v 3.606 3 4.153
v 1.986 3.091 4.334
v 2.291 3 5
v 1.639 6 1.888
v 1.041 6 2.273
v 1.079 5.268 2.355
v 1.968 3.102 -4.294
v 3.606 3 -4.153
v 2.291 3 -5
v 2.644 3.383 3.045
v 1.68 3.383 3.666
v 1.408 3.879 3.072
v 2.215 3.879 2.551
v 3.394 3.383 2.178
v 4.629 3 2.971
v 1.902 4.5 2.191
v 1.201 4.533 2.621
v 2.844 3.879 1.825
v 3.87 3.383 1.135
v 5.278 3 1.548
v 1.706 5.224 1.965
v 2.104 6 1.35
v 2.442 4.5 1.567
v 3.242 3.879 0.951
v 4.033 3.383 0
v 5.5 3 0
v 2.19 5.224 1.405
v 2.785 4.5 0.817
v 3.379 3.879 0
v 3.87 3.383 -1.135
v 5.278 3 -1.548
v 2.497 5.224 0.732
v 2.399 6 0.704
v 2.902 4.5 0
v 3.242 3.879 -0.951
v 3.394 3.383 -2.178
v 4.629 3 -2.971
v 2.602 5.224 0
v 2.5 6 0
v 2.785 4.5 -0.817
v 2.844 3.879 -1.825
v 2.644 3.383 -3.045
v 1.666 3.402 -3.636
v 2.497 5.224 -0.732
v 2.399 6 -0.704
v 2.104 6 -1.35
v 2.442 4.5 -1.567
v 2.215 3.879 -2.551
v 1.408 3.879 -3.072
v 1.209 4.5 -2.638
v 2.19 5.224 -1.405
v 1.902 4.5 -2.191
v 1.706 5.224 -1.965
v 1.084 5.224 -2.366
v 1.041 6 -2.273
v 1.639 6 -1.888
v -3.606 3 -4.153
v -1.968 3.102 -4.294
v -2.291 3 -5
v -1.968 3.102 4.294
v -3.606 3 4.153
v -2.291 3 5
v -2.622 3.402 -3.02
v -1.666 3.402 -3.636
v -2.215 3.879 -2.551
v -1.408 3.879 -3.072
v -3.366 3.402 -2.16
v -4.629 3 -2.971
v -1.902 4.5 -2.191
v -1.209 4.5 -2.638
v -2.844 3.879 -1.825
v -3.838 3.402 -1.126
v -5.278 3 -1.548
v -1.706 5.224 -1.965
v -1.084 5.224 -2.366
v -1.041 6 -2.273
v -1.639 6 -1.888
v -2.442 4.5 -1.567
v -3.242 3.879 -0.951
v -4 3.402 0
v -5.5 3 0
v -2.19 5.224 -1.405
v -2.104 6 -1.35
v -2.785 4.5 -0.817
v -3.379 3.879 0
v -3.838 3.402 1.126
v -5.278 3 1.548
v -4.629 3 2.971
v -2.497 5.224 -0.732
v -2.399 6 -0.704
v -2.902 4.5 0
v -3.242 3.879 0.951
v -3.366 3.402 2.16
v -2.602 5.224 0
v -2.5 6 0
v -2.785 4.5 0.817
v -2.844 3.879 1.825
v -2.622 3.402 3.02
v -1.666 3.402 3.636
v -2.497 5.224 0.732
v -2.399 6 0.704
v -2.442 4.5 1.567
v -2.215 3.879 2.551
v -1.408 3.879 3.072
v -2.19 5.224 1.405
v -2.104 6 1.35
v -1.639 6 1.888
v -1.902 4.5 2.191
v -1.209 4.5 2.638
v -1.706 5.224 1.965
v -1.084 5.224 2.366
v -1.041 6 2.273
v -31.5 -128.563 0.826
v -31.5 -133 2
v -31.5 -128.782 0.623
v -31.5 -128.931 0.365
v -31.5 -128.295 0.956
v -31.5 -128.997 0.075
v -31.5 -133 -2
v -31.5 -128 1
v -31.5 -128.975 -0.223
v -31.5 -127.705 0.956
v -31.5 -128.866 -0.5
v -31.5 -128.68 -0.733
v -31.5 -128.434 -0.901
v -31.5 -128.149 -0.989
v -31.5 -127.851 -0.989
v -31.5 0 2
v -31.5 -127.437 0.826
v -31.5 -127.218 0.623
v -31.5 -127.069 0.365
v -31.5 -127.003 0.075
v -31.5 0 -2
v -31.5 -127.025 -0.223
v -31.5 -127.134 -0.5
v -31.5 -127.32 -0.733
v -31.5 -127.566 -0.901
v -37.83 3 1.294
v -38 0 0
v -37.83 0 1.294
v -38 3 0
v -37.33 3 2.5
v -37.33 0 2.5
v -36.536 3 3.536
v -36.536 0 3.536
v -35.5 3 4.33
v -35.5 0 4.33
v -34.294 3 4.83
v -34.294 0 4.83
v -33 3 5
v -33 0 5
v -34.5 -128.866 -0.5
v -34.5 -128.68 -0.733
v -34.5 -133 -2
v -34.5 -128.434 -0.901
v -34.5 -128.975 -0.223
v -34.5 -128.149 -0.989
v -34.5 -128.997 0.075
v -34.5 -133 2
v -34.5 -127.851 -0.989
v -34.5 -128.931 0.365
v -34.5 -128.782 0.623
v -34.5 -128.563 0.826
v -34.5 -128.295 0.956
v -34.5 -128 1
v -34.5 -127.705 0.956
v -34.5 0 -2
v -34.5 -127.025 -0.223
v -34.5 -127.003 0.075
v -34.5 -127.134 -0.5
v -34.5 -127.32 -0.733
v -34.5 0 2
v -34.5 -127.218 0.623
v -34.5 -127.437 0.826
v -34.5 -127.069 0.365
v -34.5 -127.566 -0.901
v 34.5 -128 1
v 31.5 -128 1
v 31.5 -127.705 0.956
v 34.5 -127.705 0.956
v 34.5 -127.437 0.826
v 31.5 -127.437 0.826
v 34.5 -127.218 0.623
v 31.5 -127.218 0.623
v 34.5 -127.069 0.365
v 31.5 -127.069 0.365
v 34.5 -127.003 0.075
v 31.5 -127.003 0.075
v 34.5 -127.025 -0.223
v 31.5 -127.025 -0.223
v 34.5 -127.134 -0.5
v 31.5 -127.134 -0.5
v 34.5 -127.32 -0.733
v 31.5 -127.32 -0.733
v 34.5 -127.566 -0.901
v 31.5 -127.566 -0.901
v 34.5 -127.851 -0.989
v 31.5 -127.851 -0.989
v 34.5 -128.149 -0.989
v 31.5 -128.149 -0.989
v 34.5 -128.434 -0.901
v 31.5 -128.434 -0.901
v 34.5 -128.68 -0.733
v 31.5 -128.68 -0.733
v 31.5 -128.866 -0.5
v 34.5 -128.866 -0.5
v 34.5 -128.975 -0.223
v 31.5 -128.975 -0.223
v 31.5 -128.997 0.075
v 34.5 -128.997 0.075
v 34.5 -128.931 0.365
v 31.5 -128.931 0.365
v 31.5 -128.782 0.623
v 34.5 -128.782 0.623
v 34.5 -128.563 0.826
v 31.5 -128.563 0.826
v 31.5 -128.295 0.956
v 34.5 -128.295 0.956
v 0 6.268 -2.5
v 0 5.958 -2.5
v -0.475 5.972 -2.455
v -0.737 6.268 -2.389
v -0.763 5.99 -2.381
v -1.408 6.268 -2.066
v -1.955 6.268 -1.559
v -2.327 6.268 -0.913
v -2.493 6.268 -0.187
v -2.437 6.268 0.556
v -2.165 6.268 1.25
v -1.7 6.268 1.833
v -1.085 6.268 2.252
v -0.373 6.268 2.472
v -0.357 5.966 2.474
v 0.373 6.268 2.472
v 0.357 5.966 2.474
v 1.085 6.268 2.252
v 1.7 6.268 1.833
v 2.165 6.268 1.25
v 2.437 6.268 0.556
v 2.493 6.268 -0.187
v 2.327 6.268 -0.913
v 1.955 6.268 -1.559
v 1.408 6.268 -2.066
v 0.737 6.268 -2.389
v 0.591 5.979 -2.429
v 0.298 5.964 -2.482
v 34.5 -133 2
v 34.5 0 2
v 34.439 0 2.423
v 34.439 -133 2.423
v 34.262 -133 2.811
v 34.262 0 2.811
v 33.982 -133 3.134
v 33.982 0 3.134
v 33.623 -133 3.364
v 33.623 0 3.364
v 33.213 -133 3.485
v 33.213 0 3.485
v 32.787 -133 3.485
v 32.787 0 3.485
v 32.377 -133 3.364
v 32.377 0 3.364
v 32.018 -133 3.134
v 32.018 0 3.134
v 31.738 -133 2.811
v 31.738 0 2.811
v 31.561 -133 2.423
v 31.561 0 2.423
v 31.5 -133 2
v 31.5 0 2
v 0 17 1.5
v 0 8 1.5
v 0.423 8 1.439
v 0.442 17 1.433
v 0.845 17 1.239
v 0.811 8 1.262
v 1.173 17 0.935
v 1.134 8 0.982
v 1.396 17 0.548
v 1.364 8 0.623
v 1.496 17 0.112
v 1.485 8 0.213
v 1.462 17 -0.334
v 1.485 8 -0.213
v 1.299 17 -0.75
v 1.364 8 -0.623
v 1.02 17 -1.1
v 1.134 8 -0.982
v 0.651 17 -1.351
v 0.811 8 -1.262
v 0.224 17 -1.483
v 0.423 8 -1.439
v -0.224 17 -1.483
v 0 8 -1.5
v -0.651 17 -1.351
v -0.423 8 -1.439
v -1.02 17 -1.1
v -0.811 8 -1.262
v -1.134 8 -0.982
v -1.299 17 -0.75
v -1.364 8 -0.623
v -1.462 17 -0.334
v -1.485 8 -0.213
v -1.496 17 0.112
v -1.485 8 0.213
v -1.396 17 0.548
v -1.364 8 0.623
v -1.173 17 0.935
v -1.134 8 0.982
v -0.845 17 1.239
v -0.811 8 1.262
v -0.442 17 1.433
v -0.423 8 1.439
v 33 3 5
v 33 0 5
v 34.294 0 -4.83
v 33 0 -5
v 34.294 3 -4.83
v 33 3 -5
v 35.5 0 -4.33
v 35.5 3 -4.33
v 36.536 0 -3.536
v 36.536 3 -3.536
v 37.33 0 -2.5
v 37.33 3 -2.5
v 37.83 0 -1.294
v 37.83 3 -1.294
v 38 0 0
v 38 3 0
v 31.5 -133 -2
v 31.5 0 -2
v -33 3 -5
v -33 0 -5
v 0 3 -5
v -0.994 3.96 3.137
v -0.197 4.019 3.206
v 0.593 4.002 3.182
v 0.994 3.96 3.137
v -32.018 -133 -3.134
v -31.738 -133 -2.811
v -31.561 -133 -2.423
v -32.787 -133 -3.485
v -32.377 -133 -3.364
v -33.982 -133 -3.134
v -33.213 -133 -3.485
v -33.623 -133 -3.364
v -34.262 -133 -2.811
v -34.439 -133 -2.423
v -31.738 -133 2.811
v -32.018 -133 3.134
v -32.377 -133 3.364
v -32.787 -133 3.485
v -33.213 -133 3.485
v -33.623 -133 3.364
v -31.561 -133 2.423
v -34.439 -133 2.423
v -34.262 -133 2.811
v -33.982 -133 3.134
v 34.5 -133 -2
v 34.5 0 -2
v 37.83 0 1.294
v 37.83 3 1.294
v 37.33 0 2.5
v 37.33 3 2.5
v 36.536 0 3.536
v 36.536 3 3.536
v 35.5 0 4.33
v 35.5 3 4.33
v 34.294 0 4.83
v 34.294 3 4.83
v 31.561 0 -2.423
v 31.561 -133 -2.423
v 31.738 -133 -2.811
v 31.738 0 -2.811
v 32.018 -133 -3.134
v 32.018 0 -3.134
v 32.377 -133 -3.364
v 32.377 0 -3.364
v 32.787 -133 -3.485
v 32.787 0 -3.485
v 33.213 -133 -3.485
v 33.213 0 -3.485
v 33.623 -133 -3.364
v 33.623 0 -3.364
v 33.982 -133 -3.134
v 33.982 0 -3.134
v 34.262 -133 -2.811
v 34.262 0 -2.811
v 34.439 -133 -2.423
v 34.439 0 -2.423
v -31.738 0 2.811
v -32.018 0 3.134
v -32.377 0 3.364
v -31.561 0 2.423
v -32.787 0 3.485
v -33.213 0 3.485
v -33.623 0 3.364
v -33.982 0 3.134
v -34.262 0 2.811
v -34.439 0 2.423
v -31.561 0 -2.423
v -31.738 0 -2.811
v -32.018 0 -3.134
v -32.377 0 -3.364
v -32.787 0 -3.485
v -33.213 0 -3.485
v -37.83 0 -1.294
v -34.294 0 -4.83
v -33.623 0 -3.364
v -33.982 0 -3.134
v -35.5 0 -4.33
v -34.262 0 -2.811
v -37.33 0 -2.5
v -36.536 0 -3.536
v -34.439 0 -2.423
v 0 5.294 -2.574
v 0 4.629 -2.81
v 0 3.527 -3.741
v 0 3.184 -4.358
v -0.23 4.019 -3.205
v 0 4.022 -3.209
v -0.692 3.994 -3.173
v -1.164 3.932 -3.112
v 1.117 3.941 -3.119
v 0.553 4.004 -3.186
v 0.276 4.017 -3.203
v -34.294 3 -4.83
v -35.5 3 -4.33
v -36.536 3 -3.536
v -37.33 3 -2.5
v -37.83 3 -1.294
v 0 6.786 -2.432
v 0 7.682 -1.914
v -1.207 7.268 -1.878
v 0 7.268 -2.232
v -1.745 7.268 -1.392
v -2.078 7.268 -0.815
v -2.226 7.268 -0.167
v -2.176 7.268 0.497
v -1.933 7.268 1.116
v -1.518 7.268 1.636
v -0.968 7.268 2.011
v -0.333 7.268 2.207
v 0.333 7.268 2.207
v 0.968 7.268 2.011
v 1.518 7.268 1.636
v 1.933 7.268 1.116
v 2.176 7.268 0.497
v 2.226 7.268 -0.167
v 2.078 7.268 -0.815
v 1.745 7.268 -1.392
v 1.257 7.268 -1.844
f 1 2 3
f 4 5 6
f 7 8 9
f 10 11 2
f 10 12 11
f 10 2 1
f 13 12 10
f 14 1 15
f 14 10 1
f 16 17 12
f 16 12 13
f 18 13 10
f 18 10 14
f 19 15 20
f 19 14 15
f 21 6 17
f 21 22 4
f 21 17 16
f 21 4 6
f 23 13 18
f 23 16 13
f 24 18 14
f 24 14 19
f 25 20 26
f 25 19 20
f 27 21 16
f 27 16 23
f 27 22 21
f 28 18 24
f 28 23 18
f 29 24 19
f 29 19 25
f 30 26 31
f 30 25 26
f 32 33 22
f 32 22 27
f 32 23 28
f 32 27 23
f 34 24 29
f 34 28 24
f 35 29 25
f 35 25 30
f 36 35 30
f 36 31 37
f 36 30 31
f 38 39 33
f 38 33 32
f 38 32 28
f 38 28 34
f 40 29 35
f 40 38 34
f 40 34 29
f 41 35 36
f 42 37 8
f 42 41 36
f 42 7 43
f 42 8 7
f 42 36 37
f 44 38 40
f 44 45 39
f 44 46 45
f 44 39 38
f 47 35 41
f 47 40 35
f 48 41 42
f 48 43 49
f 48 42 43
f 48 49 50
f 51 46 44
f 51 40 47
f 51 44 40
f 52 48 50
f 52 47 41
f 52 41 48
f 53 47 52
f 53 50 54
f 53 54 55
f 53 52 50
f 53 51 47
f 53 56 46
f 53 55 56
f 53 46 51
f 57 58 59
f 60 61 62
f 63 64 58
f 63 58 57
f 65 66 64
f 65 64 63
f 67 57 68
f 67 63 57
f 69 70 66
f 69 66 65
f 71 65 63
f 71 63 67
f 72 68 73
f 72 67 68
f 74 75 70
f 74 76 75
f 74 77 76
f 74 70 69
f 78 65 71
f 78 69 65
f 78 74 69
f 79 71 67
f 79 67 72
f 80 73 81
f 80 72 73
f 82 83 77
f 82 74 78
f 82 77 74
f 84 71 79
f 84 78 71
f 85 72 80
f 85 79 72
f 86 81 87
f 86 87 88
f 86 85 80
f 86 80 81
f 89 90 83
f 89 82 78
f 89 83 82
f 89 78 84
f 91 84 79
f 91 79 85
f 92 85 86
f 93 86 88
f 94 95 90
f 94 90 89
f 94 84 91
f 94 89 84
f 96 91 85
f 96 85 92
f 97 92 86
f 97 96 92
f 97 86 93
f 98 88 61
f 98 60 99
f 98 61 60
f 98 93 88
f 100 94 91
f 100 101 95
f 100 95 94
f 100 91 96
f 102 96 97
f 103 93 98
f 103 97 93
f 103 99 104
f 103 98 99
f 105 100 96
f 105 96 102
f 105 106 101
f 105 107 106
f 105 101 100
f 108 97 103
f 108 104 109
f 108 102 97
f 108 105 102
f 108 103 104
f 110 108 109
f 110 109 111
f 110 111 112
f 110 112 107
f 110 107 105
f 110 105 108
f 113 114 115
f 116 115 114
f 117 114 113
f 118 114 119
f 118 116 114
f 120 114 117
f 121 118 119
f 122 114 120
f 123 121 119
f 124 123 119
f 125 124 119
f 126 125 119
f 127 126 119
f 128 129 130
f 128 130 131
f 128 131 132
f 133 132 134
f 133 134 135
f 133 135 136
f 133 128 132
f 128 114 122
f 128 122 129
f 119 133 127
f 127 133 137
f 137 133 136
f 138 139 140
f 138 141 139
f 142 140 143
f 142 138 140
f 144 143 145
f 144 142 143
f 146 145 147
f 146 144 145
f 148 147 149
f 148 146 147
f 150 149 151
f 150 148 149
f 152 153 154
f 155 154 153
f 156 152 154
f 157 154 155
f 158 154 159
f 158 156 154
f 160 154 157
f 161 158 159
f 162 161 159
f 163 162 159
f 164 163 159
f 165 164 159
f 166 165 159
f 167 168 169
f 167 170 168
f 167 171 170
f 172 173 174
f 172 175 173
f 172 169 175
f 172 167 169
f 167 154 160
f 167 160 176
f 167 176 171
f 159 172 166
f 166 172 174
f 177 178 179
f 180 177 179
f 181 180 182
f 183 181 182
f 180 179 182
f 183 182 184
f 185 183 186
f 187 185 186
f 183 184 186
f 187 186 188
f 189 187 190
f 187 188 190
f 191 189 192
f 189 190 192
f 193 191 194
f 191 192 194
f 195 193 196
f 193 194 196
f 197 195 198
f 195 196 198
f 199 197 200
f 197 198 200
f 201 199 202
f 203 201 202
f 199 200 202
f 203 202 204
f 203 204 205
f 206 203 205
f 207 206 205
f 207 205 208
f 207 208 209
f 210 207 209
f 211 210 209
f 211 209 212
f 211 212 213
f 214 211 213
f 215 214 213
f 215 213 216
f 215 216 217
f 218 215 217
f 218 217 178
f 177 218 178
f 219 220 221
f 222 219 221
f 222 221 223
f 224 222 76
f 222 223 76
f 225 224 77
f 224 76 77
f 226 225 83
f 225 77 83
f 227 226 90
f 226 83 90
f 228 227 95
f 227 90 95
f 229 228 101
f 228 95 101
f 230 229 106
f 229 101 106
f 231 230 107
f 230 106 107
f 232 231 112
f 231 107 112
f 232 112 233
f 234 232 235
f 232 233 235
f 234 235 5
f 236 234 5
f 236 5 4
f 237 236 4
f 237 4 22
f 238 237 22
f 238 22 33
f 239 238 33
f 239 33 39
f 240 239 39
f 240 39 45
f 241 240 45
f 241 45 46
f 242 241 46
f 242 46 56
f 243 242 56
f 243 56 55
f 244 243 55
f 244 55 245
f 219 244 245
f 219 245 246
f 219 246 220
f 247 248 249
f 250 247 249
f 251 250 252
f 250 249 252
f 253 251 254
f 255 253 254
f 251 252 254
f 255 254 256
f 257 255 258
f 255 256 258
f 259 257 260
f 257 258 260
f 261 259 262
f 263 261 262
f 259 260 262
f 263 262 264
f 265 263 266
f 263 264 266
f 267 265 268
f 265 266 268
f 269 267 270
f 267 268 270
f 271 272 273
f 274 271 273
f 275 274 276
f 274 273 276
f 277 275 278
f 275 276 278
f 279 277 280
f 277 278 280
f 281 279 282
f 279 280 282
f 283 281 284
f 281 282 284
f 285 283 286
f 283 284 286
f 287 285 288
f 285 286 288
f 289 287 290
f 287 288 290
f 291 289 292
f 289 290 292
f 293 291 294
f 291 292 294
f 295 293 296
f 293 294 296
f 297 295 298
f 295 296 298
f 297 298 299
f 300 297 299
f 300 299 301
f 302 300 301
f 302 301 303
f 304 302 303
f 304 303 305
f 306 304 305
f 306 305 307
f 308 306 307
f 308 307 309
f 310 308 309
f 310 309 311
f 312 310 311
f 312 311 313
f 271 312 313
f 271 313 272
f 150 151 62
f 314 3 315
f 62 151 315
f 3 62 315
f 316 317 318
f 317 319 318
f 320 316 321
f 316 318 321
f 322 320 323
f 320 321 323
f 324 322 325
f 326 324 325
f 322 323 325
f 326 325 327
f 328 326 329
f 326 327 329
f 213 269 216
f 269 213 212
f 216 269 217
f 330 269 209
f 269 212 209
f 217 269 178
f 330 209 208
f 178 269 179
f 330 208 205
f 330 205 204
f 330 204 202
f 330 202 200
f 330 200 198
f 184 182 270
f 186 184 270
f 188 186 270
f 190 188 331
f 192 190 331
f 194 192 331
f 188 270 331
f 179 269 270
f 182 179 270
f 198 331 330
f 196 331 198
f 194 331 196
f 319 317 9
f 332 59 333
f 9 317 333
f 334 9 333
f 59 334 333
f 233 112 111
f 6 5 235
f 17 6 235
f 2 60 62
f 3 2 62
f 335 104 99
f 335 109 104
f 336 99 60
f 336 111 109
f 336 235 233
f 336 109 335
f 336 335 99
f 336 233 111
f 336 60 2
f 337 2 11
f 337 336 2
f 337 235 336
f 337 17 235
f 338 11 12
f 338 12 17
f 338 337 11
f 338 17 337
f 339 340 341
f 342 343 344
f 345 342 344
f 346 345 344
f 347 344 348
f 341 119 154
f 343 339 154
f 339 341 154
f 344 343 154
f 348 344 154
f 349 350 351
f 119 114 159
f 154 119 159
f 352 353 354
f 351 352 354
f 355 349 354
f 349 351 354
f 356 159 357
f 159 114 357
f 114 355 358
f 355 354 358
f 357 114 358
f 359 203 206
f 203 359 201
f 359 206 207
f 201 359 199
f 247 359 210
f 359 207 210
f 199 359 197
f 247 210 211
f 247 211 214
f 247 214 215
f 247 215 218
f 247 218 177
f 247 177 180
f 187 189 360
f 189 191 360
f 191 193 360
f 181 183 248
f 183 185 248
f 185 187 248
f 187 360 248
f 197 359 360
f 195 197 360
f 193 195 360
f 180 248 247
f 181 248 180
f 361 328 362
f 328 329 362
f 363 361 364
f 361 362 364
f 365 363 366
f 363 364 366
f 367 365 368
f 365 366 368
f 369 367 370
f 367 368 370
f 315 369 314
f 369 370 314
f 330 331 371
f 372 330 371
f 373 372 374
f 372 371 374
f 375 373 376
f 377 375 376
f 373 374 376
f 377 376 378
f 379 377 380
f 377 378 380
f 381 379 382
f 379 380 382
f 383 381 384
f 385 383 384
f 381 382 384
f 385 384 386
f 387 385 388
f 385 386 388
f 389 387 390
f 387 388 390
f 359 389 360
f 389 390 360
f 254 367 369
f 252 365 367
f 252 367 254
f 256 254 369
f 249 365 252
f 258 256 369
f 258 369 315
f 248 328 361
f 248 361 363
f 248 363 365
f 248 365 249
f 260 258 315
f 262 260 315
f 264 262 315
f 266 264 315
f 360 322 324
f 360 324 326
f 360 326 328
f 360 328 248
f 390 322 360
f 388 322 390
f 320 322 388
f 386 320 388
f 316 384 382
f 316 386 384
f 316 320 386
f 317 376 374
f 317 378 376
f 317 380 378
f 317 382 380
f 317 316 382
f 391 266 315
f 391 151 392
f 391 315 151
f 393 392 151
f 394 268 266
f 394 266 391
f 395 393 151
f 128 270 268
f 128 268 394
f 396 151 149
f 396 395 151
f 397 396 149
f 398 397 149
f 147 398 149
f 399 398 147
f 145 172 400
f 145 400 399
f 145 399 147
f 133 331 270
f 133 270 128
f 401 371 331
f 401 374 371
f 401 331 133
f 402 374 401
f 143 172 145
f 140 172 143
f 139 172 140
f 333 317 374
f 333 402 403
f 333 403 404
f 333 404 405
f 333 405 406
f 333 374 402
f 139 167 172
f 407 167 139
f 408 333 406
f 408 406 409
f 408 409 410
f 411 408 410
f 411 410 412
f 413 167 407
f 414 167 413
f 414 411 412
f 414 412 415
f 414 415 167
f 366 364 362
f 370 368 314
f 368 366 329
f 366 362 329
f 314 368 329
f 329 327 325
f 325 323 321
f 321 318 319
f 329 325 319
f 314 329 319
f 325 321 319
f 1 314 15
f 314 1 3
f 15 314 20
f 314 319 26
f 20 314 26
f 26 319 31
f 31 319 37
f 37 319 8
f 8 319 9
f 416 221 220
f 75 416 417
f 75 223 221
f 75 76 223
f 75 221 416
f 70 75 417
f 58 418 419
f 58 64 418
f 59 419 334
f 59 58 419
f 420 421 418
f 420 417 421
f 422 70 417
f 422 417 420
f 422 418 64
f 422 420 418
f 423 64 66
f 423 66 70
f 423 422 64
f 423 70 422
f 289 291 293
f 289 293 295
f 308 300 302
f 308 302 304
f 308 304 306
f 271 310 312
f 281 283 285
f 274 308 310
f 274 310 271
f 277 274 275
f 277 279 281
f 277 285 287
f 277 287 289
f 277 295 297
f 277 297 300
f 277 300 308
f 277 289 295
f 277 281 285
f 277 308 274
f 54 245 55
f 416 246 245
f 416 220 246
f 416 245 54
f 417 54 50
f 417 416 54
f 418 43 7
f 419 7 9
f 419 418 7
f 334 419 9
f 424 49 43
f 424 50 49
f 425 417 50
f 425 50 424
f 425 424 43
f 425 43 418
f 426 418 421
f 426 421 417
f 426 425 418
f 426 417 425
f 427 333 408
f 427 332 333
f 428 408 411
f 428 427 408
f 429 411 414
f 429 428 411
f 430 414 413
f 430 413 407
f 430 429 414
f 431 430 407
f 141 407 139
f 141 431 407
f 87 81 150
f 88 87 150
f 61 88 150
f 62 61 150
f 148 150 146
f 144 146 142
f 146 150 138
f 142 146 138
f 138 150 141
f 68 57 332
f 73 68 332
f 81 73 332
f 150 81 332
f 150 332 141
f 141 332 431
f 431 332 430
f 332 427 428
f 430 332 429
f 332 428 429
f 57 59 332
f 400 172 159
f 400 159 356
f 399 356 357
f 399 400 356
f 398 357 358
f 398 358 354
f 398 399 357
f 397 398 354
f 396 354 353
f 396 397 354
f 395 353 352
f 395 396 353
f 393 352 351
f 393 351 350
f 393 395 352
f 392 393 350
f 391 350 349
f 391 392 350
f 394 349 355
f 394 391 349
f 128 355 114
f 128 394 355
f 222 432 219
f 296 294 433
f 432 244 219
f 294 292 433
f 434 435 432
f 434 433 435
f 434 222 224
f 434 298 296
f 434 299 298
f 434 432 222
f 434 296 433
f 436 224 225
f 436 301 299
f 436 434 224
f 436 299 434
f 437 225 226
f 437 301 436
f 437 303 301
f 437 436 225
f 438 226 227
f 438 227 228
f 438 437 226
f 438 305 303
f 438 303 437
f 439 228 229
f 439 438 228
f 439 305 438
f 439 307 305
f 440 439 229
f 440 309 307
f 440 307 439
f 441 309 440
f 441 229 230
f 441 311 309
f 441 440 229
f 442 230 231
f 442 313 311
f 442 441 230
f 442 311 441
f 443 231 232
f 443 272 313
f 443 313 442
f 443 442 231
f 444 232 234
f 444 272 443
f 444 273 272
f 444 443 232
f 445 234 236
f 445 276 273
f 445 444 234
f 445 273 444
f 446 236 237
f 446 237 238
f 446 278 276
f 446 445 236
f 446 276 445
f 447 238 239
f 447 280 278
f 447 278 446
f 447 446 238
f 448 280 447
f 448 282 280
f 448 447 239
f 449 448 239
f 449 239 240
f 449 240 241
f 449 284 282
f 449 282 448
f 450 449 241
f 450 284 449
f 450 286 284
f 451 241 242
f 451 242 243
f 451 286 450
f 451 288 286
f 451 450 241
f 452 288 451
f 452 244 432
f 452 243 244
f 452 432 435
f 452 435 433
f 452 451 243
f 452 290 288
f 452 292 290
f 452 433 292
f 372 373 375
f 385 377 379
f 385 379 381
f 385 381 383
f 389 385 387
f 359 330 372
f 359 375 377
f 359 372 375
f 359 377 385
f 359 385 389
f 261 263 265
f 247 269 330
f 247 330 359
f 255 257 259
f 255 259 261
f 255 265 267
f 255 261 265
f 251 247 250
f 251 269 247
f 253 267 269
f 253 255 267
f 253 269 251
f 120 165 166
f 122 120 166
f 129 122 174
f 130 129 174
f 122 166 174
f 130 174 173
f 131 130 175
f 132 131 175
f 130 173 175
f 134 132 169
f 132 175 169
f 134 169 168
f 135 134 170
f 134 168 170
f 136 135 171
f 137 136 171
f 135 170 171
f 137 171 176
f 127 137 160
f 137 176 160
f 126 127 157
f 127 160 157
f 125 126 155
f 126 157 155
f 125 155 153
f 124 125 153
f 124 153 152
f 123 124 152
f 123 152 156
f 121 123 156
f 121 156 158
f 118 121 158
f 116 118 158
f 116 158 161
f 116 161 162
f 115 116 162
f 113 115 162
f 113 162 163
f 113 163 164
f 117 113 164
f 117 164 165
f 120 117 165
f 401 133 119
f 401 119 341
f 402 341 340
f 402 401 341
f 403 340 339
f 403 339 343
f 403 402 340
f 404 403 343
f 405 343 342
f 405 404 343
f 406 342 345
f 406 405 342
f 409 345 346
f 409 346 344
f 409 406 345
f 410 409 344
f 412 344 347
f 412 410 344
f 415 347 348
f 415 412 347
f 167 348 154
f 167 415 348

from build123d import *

# Parameters (mm, degrees)
SALIENTE_EXTRUIR1_DEPTH = 3
CROQUIS2_R              = 2.5
SALIENTE_EXTRUIR2_DEPTH = 5
CROQUIS3_R              = 1.5
SALIENTE_EXTRUIR3_DEPTH = 9
REDONDEO1_R             = 2
REDONDEO2_R             = 3
REDONDEO3_R             = 5
SALIENTE_EXTRUIR6_DEPTH = 133
CROQUIS7_R              = 1
CORTAR_EXTRUIR6_DEPTH   = 140


# Some blends are built 0.0001 mm under size
with BuildPart() as part:
    # Croquis1 → Saliente-Extruir1 (new body)
    with BuildSketch(Plane(origin=(0, 0, 0), x_dir=(1, 0, 0), z_dir=(0, 1, 0))):
        Polygon((-38, 0), (-38, 5), (0, 5), (38, 5), (38, 0), (38, -5), (0, -5), (-38, -5), align=None)
    extrude(amount=SALIENTE_EXTRUIR1_DEPTH)

    # Croquis2 → Saliente-Extruir2 (add)
    with BuildSketch(Plane(origin=(0, 3, 0), x_dir=(1, 0, 0), z_dir=(0, 1, 0))):
        with Locations(Location((0, 0, 0), (0, 0, 90))):
            Circle(CROQUIS2_R)
    extrude(amount=SALIENTE_EXTRUIR2_DEPTH)

    # Croquis3 → Saliente-Extruir3 (add)
    with BuildSketch(Plane(origin=(0, 8, 0), x_dir=(1, 0, 0), z_dir=(0, 1, 0))):
        with Locations(Location((0, 0, 0), (0, 0, 270))):
            Circle(CROQUIS3_R)
    extrude(amount=SALIENTE_EXTRUIR3_DEPTH)

    # Redondeo1
    # the kernel refuses this fillet: 2 mm, written as the material it takes off along each edge
    with BuildSketch(Plane(origin=(0, 8, 0), x_dir=(0, 0, -1), z_dir=(1, 0, 0))) as redondeo1_piece_1:
        with BuildLine():
            CenterArc((0.5, -1.732050808), REDONDEO1_R, 0, 60)
            Line((1.5, 0), (1.52, 0.034641016))
            ThreePointArc((1.52, 0.034641016), (2, 0.04), (2.5, 0.04))
            Line((2.5, 0.04), (2.54, 0))
            Line((2.54, 0), (2.54, -1.732050808))
            Line((2.54, -1.732050808), (2.5, -1.732050808))
        make_face()
    revolve(axis=Axis((0, 8, 0), (0, 1, 0)), mode=Mode.SUBTRACT)

    # Redondeo2
    redondeo2_edges = [part.edges().sort_by_distance(p)[0] for p in [
        (0, 3, 2.5),
    ]]
    fillet(redondeo2_edges, radius=REDONDEO2_R)

    # Redondeo3
    redondeo3_edges = [part.edges().sort_by_distance(p)[0] for p in [
        (38, 1.5, 5),
        (38, 1.5, -5),
        (-38, 1.5, -5),
        (-38, 1.5, 5),
    ]]
    fillet(redondeo3_edges, radius=REDONDEO3_R - 0.0001)  # a hair under: the kernel refuses the full size

    # Croquis4 → Saliente-Extruir6 (add)
    with BuildSketch(Plane.XZ):
        with BuildLine():
            Line((-31.5, 2), (-31.5, 0))
            Line((-31.5, 0), (-31.5, -2))
            ThreePointArc((-31.5, -2), (-33, -3.5), (-34.5, -2))
            Line((-34.5, -2), (-34.5, 2))
            ThreePointArc((-34.5, 2), (-33, 3.5), (-31.5, 2))
        make_face()
        with BuildLine():
            Line((31.5, 0), (31.5, -2))
            ThreePointArc((31.5, -2), (33, -3.5), (34.5, -2))
            Line((34.5, -2), (34.5, 2))
            ThreePointArc((34.5, 2), (33, 3.5), (31.5, 2))
            Line((31.5, 2), (31.5, 0))
        make_face()
    extrude(amount=SALIENTE_EXTRUIR6_DEPTH)

    # Croquis7 → Cortar-Extruir6 (cut)
    with BuildSketch(Plane.ZY.offset(34.5)):
        with Locations((0, -128)):
            Circle(CROQUIS7_R)
    extrude(amount=-CORTAR_EXTRUIR6_DEPTH, mode=Mode.SUBTRACT)


solid = part.part
